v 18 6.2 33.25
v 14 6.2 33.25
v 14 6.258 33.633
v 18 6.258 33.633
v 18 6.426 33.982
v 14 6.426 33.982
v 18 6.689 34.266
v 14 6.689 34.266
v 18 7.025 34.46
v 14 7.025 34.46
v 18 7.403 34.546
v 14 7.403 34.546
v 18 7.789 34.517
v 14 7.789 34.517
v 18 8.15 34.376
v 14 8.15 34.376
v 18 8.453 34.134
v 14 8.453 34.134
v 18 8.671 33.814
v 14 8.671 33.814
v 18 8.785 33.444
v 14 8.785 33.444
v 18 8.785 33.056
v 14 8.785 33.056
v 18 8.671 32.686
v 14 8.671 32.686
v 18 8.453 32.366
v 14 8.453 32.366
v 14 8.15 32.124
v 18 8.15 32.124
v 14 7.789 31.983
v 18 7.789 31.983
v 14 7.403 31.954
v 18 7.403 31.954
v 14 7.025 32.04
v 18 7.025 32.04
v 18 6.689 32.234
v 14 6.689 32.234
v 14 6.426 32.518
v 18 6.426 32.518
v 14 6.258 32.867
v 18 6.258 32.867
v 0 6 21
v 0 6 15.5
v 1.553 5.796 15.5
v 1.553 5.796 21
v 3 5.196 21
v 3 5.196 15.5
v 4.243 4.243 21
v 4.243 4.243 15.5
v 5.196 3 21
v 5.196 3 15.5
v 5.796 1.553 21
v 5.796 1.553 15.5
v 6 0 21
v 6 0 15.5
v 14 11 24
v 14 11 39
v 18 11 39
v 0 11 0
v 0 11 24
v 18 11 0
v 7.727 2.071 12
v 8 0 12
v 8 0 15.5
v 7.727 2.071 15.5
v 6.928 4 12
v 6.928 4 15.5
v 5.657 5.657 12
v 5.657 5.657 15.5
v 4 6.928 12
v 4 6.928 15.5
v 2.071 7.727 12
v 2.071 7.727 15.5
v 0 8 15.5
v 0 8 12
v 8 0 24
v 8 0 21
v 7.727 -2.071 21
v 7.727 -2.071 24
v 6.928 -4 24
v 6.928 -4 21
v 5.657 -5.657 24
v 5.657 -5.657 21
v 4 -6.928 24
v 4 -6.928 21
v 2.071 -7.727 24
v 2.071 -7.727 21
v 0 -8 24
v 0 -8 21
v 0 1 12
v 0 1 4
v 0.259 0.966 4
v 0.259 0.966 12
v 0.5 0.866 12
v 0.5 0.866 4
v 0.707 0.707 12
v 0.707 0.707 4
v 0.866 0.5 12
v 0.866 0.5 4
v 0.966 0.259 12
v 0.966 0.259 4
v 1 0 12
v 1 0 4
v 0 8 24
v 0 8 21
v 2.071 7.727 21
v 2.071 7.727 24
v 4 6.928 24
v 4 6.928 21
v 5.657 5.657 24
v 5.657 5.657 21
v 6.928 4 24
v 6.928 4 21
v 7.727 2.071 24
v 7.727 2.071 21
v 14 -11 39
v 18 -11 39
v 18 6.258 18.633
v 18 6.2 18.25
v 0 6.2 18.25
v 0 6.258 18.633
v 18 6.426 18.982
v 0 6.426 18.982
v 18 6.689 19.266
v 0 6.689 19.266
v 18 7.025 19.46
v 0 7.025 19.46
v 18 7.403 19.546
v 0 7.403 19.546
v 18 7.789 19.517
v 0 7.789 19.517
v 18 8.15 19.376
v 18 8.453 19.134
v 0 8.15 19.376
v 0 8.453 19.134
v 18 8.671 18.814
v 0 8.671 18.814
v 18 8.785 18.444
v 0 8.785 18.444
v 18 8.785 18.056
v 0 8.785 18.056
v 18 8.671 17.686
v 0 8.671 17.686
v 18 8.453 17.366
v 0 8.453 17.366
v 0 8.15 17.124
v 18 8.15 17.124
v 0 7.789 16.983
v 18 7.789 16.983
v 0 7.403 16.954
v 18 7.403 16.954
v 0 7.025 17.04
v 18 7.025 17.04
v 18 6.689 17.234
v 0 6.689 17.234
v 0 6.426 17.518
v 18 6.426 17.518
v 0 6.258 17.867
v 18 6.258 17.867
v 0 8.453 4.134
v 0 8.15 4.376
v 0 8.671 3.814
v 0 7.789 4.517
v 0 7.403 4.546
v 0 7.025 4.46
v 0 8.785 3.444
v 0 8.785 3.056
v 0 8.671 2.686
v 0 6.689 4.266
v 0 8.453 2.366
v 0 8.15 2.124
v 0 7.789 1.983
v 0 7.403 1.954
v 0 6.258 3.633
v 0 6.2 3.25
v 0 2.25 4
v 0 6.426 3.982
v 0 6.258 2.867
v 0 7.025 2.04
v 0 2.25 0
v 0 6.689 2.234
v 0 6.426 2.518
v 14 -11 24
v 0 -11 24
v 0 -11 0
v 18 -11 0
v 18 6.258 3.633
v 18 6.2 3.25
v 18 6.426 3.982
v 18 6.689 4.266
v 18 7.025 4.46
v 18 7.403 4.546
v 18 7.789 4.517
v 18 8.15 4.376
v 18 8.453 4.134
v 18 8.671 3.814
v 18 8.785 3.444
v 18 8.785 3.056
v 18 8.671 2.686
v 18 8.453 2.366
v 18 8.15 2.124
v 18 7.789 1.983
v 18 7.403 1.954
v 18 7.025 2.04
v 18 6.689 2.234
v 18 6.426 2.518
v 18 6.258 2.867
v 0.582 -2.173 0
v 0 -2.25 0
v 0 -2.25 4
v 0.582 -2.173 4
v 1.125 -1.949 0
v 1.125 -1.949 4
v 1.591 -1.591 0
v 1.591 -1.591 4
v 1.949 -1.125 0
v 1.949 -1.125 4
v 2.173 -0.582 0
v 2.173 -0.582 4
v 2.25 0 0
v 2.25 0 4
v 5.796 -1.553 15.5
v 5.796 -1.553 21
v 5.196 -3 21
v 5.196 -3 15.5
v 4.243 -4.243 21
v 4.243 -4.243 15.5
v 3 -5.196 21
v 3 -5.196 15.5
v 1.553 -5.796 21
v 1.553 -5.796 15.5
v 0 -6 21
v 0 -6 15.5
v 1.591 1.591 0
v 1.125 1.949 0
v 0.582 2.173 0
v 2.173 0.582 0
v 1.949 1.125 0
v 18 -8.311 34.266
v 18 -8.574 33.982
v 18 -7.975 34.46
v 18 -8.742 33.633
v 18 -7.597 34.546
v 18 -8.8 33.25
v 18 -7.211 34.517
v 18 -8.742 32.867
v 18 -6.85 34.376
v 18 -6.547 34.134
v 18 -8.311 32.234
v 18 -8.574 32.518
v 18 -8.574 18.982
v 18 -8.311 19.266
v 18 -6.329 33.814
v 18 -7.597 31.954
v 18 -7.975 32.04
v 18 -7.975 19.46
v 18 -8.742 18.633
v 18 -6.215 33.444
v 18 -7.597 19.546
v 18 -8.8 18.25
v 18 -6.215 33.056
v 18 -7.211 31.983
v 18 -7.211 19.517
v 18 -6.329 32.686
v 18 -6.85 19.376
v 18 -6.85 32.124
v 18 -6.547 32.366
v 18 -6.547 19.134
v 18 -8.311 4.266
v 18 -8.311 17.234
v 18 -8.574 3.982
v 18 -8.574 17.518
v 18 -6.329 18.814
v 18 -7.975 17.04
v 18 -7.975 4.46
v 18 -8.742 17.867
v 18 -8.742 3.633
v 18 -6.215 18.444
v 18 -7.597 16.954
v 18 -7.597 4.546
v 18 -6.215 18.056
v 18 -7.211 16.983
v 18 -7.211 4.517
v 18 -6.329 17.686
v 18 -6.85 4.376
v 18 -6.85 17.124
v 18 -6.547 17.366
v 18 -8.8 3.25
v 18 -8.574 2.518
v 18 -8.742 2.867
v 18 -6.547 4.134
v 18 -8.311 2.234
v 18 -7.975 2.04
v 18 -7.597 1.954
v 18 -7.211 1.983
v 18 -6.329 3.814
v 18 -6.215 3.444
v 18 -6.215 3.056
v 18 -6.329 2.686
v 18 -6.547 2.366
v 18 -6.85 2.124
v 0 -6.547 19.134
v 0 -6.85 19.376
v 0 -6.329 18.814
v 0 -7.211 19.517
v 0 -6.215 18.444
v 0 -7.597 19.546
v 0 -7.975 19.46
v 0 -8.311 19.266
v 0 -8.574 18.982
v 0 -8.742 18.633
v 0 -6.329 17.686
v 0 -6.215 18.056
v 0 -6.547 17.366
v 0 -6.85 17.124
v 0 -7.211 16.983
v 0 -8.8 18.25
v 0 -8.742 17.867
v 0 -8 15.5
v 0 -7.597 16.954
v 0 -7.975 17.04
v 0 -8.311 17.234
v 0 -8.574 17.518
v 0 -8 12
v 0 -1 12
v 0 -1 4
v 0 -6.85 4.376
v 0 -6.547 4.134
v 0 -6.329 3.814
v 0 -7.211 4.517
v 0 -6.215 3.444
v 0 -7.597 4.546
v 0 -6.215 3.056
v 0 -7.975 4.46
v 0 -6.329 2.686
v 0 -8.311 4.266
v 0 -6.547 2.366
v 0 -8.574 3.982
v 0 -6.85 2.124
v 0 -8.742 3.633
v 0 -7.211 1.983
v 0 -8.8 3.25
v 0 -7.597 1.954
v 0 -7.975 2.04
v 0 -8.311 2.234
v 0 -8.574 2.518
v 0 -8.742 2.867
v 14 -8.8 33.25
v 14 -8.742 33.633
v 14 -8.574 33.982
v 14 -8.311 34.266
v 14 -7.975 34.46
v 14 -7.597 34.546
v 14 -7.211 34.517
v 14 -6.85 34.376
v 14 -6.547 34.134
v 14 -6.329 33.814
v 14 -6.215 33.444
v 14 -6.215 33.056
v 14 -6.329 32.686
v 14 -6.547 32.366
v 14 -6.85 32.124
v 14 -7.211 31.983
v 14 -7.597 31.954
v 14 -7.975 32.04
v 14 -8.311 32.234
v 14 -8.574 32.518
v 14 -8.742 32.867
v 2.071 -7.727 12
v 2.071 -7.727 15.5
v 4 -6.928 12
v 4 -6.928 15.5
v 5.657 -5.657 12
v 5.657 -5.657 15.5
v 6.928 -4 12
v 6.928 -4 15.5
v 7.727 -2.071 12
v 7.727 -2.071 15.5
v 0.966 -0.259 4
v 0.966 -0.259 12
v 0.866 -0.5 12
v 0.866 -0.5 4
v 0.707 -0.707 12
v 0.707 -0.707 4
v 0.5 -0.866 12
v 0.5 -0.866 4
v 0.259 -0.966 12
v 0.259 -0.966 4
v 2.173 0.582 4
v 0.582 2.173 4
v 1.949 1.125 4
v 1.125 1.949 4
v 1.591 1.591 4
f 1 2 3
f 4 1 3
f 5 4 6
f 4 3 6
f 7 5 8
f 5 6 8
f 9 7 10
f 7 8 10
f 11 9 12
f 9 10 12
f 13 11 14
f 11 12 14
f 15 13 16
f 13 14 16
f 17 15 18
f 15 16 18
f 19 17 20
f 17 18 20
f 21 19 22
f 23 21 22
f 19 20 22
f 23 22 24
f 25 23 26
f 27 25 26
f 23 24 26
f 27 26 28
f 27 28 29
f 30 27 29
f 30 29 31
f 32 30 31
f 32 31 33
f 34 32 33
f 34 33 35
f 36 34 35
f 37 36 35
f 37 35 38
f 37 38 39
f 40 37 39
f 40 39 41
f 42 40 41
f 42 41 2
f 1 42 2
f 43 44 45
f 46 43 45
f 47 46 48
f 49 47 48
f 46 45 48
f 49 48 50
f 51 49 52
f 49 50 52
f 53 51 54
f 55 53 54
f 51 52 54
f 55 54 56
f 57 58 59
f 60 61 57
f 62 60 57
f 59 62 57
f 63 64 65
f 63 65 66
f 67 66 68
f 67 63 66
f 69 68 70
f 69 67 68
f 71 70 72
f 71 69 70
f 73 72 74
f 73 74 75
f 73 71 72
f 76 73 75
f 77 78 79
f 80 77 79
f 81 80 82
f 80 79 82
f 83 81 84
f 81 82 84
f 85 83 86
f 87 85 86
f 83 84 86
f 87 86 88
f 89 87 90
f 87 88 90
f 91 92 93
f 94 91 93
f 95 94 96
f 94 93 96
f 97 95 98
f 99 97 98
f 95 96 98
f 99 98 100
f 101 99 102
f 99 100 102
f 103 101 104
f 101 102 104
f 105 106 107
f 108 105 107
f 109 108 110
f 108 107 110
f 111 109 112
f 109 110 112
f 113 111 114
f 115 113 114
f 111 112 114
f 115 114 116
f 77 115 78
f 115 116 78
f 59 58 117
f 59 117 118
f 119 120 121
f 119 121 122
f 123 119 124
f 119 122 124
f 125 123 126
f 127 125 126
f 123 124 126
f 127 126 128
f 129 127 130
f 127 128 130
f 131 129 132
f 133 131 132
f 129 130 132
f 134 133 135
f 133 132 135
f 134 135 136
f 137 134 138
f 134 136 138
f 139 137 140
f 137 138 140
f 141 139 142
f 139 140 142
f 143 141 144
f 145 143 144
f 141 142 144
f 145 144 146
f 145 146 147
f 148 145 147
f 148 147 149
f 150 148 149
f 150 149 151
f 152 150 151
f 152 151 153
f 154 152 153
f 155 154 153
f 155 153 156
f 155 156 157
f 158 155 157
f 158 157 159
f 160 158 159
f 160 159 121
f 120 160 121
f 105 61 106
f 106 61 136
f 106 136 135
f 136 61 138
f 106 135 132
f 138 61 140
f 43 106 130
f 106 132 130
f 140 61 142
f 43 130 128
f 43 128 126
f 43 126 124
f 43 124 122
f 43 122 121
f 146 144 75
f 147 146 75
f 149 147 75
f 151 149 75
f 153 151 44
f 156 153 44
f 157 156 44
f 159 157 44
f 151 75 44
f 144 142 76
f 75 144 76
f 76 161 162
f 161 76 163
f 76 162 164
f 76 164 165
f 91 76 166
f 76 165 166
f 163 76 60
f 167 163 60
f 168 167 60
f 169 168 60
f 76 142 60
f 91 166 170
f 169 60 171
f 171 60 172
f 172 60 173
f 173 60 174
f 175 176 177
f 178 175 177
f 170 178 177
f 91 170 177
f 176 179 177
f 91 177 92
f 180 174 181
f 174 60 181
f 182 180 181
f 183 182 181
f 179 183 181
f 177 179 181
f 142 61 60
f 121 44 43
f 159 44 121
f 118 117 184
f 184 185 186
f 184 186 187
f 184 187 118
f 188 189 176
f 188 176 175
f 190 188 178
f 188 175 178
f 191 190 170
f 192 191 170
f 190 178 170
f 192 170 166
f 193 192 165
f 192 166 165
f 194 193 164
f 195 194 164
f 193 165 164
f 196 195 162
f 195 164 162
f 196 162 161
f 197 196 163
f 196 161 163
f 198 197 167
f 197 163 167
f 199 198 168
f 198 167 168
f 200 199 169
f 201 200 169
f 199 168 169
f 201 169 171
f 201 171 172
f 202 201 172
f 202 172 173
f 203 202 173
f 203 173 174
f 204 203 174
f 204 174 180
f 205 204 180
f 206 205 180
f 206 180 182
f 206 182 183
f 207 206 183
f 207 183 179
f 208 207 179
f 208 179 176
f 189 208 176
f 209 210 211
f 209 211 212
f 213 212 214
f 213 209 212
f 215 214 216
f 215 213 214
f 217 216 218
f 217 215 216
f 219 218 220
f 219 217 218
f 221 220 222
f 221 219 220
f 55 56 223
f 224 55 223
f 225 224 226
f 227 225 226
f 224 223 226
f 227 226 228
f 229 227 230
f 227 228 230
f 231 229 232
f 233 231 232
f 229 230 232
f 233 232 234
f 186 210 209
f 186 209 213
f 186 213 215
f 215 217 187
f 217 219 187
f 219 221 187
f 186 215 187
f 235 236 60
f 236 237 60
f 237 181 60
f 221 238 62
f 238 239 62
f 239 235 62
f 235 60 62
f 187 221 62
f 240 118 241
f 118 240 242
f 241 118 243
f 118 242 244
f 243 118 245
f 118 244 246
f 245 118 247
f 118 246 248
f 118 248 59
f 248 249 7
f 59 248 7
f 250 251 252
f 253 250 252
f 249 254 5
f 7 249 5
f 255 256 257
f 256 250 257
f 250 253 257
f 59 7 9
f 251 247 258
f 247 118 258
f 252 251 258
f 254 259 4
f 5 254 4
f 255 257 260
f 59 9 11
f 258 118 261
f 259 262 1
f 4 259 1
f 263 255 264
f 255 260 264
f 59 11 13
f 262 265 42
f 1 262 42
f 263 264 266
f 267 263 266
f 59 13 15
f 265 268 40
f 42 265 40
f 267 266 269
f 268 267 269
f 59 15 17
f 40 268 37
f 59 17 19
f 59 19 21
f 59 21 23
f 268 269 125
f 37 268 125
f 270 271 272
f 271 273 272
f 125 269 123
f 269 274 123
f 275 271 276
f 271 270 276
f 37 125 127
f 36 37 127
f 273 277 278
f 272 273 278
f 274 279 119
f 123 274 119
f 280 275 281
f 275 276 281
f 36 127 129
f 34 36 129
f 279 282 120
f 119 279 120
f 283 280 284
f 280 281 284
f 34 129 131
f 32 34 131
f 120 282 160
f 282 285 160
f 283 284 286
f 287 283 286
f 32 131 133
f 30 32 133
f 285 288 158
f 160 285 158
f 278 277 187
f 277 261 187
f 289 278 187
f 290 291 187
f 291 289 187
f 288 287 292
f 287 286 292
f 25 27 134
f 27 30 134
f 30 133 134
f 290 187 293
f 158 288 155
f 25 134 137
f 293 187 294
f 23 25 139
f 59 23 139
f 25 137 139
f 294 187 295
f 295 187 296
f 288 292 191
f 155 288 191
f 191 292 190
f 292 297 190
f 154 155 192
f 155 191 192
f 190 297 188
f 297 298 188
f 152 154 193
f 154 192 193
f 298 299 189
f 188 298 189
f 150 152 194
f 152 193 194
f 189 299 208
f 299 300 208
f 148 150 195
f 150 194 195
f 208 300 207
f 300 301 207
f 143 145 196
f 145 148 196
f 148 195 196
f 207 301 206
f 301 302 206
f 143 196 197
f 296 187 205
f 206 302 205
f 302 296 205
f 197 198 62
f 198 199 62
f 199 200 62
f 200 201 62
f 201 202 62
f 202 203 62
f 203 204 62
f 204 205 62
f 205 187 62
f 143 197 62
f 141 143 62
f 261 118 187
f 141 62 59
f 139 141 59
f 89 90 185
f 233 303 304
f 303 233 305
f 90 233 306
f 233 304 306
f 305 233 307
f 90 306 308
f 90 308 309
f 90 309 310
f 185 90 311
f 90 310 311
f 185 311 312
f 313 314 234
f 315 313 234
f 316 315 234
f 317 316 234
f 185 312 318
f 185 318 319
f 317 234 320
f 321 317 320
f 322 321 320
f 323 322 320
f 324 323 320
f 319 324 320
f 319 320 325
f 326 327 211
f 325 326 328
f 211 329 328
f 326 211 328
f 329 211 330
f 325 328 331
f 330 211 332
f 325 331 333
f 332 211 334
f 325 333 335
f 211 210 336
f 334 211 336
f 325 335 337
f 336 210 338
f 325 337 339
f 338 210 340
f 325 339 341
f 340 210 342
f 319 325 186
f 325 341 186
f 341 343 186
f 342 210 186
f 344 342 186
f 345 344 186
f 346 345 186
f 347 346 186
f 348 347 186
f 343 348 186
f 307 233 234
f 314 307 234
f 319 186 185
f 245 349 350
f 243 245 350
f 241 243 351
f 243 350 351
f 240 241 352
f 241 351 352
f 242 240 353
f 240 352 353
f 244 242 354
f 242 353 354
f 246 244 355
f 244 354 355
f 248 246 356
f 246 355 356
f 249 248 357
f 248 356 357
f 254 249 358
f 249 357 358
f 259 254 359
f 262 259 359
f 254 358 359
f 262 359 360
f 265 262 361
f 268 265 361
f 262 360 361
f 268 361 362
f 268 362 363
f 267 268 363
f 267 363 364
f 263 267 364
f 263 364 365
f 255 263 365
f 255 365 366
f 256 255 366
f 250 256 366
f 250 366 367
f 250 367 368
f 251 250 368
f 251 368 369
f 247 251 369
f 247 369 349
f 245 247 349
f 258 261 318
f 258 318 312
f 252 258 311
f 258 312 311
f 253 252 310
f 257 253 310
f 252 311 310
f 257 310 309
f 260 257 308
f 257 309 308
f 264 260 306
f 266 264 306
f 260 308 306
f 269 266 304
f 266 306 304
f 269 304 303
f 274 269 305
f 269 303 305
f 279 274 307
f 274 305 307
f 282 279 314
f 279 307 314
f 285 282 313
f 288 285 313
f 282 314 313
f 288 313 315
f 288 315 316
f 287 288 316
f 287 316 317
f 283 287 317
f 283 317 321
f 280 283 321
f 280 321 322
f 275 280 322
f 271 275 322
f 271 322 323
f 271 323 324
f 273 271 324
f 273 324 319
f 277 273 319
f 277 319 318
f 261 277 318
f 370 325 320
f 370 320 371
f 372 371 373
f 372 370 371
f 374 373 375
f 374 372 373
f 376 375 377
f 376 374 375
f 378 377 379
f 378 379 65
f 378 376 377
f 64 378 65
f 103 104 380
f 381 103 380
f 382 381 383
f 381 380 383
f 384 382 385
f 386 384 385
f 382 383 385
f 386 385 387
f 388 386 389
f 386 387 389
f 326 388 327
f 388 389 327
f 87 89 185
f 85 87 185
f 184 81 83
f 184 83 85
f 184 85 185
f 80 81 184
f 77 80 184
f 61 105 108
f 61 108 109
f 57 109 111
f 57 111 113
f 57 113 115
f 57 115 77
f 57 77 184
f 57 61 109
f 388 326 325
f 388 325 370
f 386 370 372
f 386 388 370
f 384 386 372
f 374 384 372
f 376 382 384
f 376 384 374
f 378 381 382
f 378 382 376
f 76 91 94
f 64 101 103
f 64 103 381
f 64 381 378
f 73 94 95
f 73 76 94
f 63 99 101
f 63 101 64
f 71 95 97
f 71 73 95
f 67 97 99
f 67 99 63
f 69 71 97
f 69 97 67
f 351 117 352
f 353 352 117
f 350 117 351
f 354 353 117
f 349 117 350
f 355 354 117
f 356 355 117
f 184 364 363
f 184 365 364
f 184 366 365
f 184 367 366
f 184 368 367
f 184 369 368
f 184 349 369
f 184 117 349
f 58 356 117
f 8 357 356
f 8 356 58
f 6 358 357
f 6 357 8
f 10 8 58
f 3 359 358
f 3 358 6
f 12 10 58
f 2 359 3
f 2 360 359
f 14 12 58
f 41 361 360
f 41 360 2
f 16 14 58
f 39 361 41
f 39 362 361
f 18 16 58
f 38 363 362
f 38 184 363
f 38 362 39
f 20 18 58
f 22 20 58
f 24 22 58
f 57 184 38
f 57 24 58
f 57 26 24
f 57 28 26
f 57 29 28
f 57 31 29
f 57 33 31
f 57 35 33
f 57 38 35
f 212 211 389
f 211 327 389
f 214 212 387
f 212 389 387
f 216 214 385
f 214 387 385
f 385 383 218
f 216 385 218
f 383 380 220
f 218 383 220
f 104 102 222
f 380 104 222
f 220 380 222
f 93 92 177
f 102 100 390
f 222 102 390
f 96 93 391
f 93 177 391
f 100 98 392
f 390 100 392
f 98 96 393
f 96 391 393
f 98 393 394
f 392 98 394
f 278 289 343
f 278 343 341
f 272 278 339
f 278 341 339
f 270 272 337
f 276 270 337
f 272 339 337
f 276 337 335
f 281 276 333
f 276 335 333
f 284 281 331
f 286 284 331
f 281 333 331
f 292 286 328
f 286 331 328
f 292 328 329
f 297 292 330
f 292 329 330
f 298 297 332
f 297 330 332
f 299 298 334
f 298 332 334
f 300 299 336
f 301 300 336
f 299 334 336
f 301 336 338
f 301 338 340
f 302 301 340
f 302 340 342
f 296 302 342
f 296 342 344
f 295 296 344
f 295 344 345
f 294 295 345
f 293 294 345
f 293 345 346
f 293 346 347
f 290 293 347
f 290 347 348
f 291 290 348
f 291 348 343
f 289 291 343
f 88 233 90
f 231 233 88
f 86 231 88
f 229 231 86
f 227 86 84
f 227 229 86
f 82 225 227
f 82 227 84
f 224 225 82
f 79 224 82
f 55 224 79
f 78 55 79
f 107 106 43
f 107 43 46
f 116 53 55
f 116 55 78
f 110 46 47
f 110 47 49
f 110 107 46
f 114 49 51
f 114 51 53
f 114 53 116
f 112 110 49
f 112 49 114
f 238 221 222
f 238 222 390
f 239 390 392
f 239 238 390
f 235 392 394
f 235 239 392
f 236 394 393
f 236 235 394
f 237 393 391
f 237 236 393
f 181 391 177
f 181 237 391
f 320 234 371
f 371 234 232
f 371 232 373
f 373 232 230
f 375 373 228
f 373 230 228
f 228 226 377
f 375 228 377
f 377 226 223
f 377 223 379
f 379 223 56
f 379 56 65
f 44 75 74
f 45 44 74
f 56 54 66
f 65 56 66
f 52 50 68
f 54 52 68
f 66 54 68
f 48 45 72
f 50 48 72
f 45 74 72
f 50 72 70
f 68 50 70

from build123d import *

# Parameters (mm, degrees)
F2_DEPTH  = 24
F1_W      = 3
F1_H      = 22
F3_DEPTH  = 24
F1_W_2    = 4
F4_DEPTH  = 39
F5_DEPTH  = 21
F6_DEPTH  = 15.5
F7_DEPTH  = 12
F8_DEPTH  = 4
F9_R      = 1.3
F10_DEPTH = 18.001


with BuildPart() as f2:
    # F1 (on Top) → F2 (new body)
    with BuildSketch(Plane.XY):
        with BuildLine():
            Line((11, 11), (0, 11))
            Line((0, 11), (0, 8))
            ThreePointArc((0, 8), (5.6568542495, 5.6568542495), (8, 0))
            ThreePointArc((8, 0), (5.6568542495, -5.6568542495), (0, -8))
            Line((0, -8), (0, -11))
            Line((0, -11), (11, -11))
            Line((11, -11), (11, 11))
        make_face()
    extrude(amount=F2_DEPTH)

    # F1 (on Top) → F3 (join)
    with BuildSketch(Plane.XY):
        with Locations((12.5, 0)):
            Rectangle(F1_W, F1_H)
    extrude(amount=F3_DEPTH)

    # F1 (on Top) → F4 (join)
    with BuildSketch(Plane.XY):
        with Locations((16, 0)):
            Rectangle(F1_W_2, F1_H)
    extrude(amount=F4_DEPTH)

    # F1 (on Top) → F5 (join)
    with BuildSketch(Plane.XY):
        with BuildLine():
            ThreePointArc((8, 0), (5.6568542495, 5.6568542495), (0, 8))
            Line((0, 8), (0, 6))
            ThreePointArc((0, 6), (4.2426406871, 4.2426406871), (6, 0))
            ThreePointArc((6, 0), (4.2426406871, -4.2426406871), (0, -6))
            Line((0, -6), (0, -8))
            ThreePointArc((0, -8), (5.6568542495, -5.6568542495), (8, 0))
        make_face()
    extrude(amount=F5_DEPTH)

    # F1 (on Top) → F6 (cut)
    with BuildSketch(Plane.XY):
        with BuildLine():
            ThreePointArc((8, 0), (5.6568542495, 5.6568542495), (0, 8))
            Line((0, 8), (0, 6))
            ThreePointArc((0, 6), (4.2426406871, 4.2426406871), (6, 0))
            ThreePointArc((6, 0), (4.2426406871, -4.2426406871), (0, -6))
            Line((0, -6), (0, -8))
            ThreePointArc((0, -8), (5.6568542495, -5.6568542495), (8, 0))
        make_face()
        with BuildLine():
            Line((0, 6), (0, 8))
            ThreePointArc((0, 8), (-8, 0), (0, -8))
            Line((0, -8), (0, -6))
            ThreePointArc((0, -6), (-6, 0), (0, 6))
        make_face()
    extrude(amount=F6_DEPTH, mode=Mode.SUBTRACT)

    # F1 (on Top) → F7 (join)
    with BuildSketch(Plane.XY):
        with BuildLine():
            ThreePointArc((8, 0), (5.6568542495, 5.6568542495), (0, 8))
            Line((0, 8), (0, 6))
            ThreePointArc((0, 6), (4.2426406871, 4.2426406871), (6, 0))
            ThreePointArc((6, 0), (4.2426406871, -4.2426406871), (0, -6))
            Line((0, -6), (0, -8))
            ThreePointArc((0, -8), (5.6568542495, -5.6568542495), (8, 0))
        make_face()
        with BuildLine():
            ThreePointArc((6, 0), (4.2426406871, 4.2426406871), (0, 6))
            Line((0, 6), (0, 2.25))
            ThreePointArc((0, 2.25), (1.5909902577, 1.5909902577), (2.25, 0))
            ThreePointArc((2.25, 0), (1.5909902577, -1.5909902577), (0, -2.25))
            Line((0, -2.25), (0, -6))
            ThreePointArc((0, -6), (4.2426406871, -4.2426406871), (6, 0))
        make_face()
        with BuildLine():
            ThreePointArc((2.25, 0), (1.5909902577, 1.5909902577), (0, 2.25))
            Line((0, 2.25), (0, 1))
            ThreePointArc((0, 1), (0.7071067812, 0.7071067812), (1, 0))
            ThreePointArc((1, 0), (0.7071067812, -0.7071067812), (0, -1))
            Line((0, -1), (0, -2.25))
            ThreePointArc((0, -2.25), (1.5909902577, -1.5909902577), (2.25, 0))
        make_face()
    extrude(amount=F7_DEPTH)

    # F1 (on Top) → F8 (cut)
    with BuildSketch(Plane.XY):
        with BuildLine():
            ThreePointArc((2.25, 0), (1.5909902577, 1.5909902577), (0, 2.25))
            Line((0, 2.25), (0, 1))
            ThreePointArc((0, 1), (0.7071067812, 0.7071067812), (1, 0))
            ThreePointArc((1, 0), (0.7071067812, -0.7071067812), (0, -1))
            Line((0, -1), (0, -2.25))
            ThreePointArc((0, -2.25), (1.5909902577, -1.5909902577), (2.25, 0))
        make_face()
        with BuildLine():
            Line((0, 1), (0, 2.25))
            ThreePointArc((0, 2.25), (-2.25, 0), (0, -2.25))
            Line((0, -2.25), (0, -1))
            ThreePointArc((0, -1), (-1, 0), (0, 1))
        make_face()
    extrude(amount=F8_DEPTH, mode=Mode.SUBTRACT)

    # F9 (on face) → F10 (cut, through all)
    with BuildSketch(Plane(origin=(0, 0, 0), x_dir=(0, -1, 0), z_dir=(-1, 0, 0))):
        with Locations((-7.5, 18.25)):
            Circle(F9_R)
        with Locations((7.5, 18.25)):
            Circle(F9_R)
        with Locations((7.5, 3.25)):
            Circle(F9_R)
        with Locations((-7.5, 3.25)):
            Circle(F9_R)
        with Locations((-7.5, 33.25)):
            Circle(F9_R)
        with Locations((7.5, 33.25)):
            Circle(F9_R)
    extrude(amount=-F10_DEPTH, mode=Mode.SUBTRACT)


solid = f2.part
